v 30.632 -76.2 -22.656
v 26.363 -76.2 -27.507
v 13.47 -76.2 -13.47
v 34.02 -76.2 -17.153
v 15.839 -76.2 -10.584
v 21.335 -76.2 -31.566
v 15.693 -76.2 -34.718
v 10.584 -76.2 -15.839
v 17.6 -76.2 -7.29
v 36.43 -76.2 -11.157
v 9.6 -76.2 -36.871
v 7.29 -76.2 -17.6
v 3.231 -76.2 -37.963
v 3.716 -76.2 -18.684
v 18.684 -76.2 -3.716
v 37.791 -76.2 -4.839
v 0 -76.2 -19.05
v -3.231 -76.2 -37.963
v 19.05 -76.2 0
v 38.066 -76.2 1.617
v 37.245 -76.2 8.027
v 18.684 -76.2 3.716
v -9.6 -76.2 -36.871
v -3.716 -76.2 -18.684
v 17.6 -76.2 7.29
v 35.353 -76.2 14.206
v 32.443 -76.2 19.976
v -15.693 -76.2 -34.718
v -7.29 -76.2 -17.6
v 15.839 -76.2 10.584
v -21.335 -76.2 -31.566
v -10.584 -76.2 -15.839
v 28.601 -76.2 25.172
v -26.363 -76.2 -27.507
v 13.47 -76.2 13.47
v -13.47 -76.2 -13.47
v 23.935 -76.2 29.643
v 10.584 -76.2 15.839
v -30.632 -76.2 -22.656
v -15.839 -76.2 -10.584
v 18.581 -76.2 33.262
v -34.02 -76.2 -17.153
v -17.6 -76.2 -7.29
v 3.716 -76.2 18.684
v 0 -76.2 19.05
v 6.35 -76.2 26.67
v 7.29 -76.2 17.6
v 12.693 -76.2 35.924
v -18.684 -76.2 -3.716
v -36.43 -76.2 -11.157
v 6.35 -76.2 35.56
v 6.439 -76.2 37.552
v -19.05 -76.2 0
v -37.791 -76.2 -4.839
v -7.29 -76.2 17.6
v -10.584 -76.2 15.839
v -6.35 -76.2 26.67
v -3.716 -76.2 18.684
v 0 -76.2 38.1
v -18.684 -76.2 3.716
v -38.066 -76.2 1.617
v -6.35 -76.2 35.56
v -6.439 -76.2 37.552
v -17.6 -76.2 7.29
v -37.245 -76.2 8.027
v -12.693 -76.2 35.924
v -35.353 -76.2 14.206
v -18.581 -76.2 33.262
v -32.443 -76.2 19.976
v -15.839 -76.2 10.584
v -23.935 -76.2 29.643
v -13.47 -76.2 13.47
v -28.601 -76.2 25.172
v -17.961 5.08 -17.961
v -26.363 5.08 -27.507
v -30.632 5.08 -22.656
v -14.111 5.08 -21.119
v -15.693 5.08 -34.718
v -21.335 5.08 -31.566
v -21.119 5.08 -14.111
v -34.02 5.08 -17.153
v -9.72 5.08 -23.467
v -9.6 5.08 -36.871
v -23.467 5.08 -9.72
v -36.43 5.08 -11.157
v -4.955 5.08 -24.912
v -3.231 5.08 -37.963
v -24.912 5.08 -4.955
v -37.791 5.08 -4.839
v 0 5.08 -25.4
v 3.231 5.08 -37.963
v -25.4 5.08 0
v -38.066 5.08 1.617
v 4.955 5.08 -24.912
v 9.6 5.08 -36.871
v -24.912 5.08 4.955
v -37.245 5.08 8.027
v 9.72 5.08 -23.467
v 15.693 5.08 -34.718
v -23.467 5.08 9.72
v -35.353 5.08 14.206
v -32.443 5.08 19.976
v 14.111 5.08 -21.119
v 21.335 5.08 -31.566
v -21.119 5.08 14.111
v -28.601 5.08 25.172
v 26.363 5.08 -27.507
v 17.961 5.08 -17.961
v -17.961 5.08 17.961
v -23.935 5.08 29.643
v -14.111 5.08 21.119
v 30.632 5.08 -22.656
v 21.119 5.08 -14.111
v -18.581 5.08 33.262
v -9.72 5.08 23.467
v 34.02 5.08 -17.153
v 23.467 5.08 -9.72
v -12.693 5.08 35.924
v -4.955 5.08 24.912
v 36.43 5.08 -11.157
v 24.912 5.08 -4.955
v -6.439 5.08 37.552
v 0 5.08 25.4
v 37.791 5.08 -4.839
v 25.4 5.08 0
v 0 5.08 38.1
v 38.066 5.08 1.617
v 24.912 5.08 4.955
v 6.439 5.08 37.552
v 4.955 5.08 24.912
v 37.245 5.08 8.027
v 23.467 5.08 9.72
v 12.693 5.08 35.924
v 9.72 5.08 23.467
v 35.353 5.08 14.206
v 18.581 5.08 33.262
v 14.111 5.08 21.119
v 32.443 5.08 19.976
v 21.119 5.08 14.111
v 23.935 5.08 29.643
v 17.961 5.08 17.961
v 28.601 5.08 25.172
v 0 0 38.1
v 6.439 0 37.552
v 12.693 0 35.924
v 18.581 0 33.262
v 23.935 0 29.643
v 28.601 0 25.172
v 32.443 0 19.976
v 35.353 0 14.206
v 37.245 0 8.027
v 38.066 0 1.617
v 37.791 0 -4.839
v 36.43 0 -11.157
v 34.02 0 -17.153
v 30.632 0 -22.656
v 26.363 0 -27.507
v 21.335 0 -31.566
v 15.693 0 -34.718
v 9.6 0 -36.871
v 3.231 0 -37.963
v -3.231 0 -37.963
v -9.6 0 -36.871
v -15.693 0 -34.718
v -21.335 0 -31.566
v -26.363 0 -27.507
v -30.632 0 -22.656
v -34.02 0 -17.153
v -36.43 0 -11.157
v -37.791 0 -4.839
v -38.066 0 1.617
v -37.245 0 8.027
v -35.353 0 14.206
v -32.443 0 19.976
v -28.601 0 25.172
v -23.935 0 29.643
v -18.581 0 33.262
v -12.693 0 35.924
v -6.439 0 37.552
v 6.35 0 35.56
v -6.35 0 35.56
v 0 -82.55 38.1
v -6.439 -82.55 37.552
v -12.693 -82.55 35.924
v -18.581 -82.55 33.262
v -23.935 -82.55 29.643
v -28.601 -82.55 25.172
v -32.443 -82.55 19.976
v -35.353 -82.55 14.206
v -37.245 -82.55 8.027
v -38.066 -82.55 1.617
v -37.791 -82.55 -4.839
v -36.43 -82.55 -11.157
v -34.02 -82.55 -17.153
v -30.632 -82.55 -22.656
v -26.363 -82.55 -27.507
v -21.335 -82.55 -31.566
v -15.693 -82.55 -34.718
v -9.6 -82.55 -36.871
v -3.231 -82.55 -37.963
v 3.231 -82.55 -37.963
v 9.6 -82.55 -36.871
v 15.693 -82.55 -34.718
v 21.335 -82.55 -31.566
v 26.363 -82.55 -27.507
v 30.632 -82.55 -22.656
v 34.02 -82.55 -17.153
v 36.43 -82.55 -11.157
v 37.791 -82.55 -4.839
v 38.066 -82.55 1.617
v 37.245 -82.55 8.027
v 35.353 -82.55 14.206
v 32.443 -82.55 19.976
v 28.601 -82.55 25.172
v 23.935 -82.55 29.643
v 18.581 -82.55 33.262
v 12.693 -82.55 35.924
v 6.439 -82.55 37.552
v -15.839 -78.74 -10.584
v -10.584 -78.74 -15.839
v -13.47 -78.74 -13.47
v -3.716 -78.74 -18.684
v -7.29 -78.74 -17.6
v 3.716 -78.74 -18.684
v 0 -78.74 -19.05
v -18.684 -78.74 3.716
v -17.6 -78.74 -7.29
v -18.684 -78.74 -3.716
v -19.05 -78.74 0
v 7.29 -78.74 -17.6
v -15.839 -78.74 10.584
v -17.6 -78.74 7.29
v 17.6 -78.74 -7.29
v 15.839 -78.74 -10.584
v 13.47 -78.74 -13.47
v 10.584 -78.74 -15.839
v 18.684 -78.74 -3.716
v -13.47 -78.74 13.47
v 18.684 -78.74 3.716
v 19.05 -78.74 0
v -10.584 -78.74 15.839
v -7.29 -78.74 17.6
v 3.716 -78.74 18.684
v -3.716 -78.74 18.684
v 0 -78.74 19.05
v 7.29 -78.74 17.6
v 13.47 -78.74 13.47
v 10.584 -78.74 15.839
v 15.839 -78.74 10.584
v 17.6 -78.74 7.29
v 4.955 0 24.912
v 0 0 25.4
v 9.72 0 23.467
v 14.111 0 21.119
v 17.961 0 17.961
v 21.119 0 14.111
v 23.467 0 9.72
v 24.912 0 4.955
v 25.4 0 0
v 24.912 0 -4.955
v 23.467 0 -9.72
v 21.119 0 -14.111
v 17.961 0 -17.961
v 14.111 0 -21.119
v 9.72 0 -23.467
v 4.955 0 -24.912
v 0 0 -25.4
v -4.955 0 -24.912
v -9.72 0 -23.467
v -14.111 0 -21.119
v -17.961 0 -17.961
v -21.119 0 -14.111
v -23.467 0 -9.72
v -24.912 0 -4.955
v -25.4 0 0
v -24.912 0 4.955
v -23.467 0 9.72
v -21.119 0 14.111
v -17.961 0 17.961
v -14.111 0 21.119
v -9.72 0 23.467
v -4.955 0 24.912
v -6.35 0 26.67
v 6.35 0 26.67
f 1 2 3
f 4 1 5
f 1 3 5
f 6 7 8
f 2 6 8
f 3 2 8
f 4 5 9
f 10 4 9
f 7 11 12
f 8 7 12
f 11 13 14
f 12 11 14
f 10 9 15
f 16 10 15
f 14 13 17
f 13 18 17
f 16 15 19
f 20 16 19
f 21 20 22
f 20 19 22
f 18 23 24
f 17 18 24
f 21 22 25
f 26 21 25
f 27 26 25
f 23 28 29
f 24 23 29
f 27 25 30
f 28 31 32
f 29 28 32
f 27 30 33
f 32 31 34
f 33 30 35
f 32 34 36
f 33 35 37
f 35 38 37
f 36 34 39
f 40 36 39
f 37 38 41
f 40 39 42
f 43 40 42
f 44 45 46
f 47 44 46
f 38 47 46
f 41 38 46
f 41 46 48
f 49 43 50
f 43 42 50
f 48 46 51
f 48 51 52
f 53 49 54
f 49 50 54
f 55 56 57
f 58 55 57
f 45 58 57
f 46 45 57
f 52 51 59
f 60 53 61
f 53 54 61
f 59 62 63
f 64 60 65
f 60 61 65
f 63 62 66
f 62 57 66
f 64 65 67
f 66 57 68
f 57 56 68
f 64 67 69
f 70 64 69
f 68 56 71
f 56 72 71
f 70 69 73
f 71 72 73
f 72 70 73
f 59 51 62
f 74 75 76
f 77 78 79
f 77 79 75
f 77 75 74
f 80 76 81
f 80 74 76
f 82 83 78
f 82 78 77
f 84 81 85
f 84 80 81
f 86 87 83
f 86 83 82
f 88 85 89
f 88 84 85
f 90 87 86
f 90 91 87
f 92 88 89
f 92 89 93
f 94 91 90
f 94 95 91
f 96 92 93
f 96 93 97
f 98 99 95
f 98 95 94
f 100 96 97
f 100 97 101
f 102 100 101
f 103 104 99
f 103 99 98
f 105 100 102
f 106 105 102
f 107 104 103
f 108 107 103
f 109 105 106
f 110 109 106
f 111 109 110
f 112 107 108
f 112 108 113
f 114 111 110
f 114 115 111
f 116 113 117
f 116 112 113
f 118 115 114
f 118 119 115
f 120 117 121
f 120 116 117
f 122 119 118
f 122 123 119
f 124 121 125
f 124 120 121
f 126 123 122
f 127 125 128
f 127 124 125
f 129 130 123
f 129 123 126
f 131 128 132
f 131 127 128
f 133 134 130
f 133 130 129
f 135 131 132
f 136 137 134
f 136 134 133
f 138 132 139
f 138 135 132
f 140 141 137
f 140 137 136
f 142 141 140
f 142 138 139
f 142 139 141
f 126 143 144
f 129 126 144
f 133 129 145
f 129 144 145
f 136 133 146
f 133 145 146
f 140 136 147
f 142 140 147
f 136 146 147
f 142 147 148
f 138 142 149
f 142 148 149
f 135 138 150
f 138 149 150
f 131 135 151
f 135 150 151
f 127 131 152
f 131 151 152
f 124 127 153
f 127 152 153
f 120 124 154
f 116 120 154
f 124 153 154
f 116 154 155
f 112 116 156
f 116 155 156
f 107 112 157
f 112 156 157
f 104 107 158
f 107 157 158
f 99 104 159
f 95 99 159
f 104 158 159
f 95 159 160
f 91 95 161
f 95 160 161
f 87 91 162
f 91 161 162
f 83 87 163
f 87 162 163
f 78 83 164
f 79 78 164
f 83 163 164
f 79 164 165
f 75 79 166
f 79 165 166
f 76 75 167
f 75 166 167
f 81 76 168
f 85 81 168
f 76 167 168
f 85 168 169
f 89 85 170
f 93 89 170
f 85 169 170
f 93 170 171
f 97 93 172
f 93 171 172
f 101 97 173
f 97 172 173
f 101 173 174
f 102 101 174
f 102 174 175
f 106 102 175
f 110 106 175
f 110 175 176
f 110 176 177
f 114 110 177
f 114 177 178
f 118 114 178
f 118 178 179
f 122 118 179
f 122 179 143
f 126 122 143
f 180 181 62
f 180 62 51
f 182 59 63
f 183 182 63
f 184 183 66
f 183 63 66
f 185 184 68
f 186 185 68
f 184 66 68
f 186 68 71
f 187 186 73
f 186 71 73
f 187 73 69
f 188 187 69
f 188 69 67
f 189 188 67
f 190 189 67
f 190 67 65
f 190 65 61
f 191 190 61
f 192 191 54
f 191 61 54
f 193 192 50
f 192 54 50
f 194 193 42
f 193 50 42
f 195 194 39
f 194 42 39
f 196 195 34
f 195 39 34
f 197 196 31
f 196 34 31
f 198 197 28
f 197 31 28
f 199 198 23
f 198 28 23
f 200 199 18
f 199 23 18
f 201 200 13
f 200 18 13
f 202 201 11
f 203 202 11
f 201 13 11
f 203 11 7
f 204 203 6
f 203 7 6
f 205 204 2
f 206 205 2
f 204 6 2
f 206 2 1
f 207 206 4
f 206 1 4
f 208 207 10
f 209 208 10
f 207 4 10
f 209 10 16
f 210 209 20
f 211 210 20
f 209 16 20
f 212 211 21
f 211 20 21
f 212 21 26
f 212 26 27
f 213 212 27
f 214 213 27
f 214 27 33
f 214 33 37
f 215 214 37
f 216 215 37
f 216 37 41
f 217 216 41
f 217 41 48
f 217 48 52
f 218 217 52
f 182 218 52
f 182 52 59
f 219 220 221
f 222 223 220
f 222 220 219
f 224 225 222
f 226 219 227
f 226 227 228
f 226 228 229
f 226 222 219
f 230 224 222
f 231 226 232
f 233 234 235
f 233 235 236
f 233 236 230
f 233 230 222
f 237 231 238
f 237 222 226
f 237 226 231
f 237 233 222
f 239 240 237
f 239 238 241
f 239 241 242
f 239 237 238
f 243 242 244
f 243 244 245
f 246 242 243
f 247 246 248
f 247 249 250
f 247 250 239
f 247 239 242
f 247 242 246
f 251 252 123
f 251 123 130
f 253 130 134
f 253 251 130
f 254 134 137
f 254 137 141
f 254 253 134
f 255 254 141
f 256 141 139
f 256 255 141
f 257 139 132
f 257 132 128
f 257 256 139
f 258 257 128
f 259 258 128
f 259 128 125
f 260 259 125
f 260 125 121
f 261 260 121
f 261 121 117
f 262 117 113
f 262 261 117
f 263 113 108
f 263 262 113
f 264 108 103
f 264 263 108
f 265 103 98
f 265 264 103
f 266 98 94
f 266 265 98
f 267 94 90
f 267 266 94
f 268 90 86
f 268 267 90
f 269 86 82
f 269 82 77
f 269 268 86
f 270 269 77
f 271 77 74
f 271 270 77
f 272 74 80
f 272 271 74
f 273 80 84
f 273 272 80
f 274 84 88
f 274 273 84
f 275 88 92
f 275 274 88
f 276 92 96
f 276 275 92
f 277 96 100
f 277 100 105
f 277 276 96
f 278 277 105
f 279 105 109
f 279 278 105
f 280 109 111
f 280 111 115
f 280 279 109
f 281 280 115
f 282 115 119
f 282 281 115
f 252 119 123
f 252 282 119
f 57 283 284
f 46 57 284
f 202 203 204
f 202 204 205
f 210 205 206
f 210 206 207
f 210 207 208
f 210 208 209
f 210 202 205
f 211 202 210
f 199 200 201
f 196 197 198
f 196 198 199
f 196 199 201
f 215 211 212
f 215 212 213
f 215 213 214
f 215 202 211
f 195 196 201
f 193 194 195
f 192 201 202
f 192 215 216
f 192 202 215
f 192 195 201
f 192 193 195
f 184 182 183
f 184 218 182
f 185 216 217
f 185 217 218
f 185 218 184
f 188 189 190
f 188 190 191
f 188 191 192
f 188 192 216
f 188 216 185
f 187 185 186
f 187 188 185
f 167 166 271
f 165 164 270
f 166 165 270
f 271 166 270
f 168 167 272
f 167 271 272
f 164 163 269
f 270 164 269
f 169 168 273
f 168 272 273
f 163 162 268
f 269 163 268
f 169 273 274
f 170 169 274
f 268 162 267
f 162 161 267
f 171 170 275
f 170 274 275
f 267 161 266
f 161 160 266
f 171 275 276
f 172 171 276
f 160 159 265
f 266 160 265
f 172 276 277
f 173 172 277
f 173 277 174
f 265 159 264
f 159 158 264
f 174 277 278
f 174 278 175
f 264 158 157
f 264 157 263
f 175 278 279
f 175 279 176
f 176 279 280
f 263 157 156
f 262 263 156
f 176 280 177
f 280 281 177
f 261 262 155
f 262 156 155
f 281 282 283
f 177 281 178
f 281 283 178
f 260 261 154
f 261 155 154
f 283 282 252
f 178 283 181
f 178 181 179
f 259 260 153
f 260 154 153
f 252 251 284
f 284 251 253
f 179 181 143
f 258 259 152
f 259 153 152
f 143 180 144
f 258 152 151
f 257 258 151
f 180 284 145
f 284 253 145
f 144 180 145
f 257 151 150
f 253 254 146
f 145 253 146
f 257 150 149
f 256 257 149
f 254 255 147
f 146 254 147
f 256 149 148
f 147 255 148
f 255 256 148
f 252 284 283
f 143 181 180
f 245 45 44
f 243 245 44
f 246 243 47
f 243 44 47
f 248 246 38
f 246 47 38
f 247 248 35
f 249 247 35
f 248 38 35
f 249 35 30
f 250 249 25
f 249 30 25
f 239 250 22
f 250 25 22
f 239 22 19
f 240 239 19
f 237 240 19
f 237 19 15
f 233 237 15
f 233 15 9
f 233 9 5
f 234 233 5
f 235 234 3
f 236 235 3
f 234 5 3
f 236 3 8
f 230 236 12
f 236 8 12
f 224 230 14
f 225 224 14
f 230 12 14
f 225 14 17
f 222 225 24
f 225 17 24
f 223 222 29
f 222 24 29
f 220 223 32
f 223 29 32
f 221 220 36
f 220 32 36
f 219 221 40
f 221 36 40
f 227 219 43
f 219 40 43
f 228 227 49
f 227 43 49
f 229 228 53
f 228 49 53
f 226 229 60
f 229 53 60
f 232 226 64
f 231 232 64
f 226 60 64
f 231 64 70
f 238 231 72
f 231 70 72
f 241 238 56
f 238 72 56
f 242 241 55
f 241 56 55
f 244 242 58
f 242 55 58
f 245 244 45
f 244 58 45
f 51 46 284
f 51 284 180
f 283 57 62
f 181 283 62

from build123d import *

# Parameters (mm, degrees)
SKETCH1_R           = 38.1
SKETCH1_R_2         = 25.4
BOSS_EXTRUDE1_DEPTH = 5.08
SKETCH4_W           = 12.7
SKETCH4_H           = 8.89
BOSS_EXTRUDE3_DEPTH = 76.2
SKETCH5_R           = 38.1
BOSS_EXTRUDE4_DEPTH = 6.35
SKETCH6_R           = 19.05
CUT_EXTRUDE1_DEPTH  = 2.54


with BuildPart() as part:
    # Sketch1 → Boss-Extrude1 (new body)
    with BuildSketch(Plane(origin=(0, 0, 0), x_dir=(1, 0, 0), z_dir=(0, 1, 0))):
        with Locations(Location((0, 0, 0), (0, 0, 270))):  # turned: the seam where the file's is
            Circle(SKETCH1_R)
        with Locations(Location((0, 0, 0), (0, 0, 270))):  # turned: the seam where the file's is
            Circle(SKETCH1_R_2, mode=Mode.SUBTRACT)
    extrude(amount=BOSS_EXTRUDE1_DEPTH)

    # Sketch4 → Boss-Extrude3 (add)
    with BuildSketch(Plane.XZ):
        with Locations((0, 31.115)):
            Rectangle(SKETCH4_W, SKETCH4_H)
    extrude(amount=BOSS_EXTRUDE3_DEPTH)

    # Sketch5 → Boss-Extrude4 (add)
    with BuildSketch(Plane.XZ.offset(76.2)):
        with Locations(Location((0, 0, 0), (0, 0, 90))):  # turned: the seam where the file's is
            Circle(SKETCH5_R)
    extrude(amount=BOSS_EXTRUDE4_DEPTH)

    # Sketch6 → Cut-Extrude1 (cut)
    with BuildSketch(Plane(origin=(0, -76.2, 0), x_dir=(1, 0, 0), z_dir=(0, 1, 0))):
        with Locations(Location((0, 0, 0), (0, 0, 270))):  # turned: the seam where the file's is
            Circle(SKETCH6_R)
    extrude(amount=-CUT_EXTRUDE1_DEPTH, mode=Mode.SUBTRACT)


solid = part.part
